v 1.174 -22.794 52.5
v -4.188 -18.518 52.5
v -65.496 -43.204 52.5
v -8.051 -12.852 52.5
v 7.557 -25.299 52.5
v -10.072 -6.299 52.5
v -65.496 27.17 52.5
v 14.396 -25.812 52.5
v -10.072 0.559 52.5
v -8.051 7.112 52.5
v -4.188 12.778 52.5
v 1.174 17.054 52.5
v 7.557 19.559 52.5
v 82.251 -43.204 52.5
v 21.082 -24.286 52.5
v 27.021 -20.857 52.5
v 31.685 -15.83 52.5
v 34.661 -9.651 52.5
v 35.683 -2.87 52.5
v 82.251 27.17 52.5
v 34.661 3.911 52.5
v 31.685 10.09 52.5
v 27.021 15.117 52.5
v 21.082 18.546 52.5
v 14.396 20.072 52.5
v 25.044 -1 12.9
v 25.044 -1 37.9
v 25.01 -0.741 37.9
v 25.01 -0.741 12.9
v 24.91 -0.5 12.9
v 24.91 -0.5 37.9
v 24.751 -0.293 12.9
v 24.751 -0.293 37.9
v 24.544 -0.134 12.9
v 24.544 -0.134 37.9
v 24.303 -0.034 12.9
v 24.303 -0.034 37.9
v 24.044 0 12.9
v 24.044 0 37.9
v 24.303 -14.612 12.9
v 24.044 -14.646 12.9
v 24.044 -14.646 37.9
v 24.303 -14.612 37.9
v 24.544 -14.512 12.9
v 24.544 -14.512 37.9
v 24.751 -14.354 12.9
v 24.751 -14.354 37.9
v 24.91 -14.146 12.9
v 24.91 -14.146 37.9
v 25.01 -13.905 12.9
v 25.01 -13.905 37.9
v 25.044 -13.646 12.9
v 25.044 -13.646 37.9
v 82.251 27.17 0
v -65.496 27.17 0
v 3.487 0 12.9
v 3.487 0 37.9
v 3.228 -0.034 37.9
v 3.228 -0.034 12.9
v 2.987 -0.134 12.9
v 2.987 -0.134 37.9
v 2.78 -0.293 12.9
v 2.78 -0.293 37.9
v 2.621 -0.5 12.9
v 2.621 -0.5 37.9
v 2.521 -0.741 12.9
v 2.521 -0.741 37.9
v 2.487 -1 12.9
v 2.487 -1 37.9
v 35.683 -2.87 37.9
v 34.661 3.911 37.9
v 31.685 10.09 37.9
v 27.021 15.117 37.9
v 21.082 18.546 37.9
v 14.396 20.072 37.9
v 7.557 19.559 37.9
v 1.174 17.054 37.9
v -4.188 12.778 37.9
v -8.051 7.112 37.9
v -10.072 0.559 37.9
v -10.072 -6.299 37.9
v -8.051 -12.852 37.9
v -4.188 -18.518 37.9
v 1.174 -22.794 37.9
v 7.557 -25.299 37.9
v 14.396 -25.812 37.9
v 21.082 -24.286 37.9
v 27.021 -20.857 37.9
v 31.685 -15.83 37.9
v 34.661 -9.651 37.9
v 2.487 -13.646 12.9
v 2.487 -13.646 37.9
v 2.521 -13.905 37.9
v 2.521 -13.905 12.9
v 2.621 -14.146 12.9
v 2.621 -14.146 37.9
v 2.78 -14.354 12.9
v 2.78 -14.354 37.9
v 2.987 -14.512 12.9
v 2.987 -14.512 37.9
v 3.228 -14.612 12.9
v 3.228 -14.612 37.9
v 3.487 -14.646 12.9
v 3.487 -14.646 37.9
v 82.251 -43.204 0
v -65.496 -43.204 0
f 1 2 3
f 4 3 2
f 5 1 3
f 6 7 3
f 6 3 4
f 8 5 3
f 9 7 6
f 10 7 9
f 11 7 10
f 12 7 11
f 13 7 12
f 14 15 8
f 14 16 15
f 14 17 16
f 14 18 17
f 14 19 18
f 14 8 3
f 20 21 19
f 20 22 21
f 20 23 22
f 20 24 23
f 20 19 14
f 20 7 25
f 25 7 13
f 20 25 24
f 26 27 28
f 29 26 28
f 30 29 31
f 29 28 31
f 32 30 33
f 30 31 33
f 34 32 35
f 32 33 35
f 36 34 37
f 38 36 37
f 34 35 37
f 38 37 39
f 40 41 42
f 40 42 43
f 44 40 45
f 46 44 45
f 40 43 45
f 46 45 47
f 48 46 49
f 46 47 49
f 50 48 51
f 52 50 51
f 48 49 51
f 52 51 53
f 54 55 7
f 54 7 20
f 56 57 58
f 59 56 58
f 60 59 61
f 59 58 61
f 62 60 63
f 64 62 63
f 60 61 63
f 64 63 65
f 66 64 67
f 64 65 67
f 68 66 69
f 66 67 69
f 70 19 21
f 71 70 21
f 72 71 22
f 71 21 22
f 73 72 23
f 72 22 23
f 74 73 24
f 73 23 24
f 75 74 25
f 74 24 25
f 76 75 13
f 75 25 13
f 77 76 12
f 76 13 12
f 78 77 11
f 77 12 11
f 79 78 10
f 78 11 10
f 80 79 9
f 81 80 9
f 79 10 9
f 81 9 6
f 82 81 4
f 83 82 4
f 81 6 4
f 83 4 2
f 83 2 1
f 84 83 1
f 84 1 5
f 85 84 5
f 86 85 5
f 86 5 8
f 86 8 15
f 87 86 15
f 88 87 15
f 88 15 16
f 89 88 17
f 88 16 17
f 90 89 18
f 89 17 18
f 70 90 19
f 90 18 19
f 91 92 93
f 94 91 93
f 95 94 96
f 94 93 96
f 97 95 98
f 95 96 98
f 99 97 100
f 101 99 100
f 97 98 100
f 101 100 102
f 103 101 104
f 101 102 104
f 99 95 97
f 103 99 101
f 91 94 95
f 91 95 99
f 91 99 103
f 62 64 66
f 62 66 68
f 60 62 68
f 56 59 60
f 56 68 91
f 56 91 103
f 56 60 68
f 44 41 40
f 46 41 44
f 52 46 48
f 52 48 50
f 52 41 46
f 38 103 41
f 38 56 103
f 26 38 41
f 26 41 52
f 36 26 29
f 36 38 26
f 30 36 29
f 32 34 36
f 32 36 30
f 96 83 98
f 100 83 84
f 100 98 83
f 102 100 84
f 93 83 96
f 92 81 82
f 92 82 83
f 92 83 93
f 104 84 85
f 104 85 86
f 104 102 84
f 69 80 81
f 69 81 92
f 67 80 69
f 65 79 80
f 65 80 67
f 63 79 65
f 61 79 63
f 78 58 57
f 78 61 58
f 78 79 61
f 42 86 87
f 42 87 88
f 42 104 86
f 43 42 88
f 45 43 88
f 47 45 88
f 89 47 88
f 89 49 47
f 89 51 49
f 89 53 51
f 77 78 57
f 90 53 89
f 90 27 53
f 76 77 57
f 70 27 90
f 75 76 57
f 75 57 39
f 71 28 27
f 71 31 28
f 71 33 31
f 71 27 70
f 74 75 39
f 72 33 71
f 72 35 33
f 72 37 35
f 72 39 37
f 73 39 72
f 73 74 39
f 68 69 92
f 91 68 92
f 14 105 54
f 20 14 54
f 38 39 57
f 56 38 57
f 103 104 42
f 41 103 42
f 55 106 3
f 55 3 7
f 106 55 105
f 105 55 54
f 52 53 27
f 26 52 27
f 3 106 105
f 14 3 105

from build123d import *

# Parameters (mm, degrees)
F0_W     = 147.747025
F0_H     = 70.374168
F1_DEPTH = 52.5
F2_R     = 23.006046
F3_DEPTH = 14.6
F5_DEPTH = 25


with BuildPart() as f1:
    # F0 (on Top) → F1 (new body)
    with BuildSketch(Plane.XY):
        with Locations((8.377738, -8.017082)):
            Rectangle(F0_W, F0_H)
    extrude(amount=F1_DEPTH)

    # F2 (on face) → F3 (cut)
    with BuildSketch(Plane.XY.offset(52.5)):
        with Locations((12.676676, -2.870056)):
            Circle(F2_R)
    extrude(amount=-F3_DEPTH, mode=Mode.SUBTRACT)

    # F4 (on face) → F5 (cut)
    with BuildSketch(Plane.XY.offset(37.9)):
        with BuildLine():
            Line((24.04391, 0), (3.486699, 0))
            ThreePointArc((3.486699, 0), (2.779592, -0.292893), (2.486699, -1))
            Line((2.486699, -1), (2.486699, -13.646441))
            ThreePointArc((2.486699, -13.646441), (2.779592, -14.353548), (3.486699, -14.646441))
            Line((3.486699, -14.646441), (24.04391, -14.646441))
            ThreePointArc((24.04391, -14.646441), (24.751016, -14.353548), (25.04391, -13.646441))
            Line((25.04391, -13.646441), (25.04391, -1))
            ThreePointArc((25.04391, -1), (24.751016, -0.292893), (24.04391, 0))
        make_face()
    extrude(amount=-F5_DEPTH, mode=Mode.SUBTRACT)


solid = f1.part
